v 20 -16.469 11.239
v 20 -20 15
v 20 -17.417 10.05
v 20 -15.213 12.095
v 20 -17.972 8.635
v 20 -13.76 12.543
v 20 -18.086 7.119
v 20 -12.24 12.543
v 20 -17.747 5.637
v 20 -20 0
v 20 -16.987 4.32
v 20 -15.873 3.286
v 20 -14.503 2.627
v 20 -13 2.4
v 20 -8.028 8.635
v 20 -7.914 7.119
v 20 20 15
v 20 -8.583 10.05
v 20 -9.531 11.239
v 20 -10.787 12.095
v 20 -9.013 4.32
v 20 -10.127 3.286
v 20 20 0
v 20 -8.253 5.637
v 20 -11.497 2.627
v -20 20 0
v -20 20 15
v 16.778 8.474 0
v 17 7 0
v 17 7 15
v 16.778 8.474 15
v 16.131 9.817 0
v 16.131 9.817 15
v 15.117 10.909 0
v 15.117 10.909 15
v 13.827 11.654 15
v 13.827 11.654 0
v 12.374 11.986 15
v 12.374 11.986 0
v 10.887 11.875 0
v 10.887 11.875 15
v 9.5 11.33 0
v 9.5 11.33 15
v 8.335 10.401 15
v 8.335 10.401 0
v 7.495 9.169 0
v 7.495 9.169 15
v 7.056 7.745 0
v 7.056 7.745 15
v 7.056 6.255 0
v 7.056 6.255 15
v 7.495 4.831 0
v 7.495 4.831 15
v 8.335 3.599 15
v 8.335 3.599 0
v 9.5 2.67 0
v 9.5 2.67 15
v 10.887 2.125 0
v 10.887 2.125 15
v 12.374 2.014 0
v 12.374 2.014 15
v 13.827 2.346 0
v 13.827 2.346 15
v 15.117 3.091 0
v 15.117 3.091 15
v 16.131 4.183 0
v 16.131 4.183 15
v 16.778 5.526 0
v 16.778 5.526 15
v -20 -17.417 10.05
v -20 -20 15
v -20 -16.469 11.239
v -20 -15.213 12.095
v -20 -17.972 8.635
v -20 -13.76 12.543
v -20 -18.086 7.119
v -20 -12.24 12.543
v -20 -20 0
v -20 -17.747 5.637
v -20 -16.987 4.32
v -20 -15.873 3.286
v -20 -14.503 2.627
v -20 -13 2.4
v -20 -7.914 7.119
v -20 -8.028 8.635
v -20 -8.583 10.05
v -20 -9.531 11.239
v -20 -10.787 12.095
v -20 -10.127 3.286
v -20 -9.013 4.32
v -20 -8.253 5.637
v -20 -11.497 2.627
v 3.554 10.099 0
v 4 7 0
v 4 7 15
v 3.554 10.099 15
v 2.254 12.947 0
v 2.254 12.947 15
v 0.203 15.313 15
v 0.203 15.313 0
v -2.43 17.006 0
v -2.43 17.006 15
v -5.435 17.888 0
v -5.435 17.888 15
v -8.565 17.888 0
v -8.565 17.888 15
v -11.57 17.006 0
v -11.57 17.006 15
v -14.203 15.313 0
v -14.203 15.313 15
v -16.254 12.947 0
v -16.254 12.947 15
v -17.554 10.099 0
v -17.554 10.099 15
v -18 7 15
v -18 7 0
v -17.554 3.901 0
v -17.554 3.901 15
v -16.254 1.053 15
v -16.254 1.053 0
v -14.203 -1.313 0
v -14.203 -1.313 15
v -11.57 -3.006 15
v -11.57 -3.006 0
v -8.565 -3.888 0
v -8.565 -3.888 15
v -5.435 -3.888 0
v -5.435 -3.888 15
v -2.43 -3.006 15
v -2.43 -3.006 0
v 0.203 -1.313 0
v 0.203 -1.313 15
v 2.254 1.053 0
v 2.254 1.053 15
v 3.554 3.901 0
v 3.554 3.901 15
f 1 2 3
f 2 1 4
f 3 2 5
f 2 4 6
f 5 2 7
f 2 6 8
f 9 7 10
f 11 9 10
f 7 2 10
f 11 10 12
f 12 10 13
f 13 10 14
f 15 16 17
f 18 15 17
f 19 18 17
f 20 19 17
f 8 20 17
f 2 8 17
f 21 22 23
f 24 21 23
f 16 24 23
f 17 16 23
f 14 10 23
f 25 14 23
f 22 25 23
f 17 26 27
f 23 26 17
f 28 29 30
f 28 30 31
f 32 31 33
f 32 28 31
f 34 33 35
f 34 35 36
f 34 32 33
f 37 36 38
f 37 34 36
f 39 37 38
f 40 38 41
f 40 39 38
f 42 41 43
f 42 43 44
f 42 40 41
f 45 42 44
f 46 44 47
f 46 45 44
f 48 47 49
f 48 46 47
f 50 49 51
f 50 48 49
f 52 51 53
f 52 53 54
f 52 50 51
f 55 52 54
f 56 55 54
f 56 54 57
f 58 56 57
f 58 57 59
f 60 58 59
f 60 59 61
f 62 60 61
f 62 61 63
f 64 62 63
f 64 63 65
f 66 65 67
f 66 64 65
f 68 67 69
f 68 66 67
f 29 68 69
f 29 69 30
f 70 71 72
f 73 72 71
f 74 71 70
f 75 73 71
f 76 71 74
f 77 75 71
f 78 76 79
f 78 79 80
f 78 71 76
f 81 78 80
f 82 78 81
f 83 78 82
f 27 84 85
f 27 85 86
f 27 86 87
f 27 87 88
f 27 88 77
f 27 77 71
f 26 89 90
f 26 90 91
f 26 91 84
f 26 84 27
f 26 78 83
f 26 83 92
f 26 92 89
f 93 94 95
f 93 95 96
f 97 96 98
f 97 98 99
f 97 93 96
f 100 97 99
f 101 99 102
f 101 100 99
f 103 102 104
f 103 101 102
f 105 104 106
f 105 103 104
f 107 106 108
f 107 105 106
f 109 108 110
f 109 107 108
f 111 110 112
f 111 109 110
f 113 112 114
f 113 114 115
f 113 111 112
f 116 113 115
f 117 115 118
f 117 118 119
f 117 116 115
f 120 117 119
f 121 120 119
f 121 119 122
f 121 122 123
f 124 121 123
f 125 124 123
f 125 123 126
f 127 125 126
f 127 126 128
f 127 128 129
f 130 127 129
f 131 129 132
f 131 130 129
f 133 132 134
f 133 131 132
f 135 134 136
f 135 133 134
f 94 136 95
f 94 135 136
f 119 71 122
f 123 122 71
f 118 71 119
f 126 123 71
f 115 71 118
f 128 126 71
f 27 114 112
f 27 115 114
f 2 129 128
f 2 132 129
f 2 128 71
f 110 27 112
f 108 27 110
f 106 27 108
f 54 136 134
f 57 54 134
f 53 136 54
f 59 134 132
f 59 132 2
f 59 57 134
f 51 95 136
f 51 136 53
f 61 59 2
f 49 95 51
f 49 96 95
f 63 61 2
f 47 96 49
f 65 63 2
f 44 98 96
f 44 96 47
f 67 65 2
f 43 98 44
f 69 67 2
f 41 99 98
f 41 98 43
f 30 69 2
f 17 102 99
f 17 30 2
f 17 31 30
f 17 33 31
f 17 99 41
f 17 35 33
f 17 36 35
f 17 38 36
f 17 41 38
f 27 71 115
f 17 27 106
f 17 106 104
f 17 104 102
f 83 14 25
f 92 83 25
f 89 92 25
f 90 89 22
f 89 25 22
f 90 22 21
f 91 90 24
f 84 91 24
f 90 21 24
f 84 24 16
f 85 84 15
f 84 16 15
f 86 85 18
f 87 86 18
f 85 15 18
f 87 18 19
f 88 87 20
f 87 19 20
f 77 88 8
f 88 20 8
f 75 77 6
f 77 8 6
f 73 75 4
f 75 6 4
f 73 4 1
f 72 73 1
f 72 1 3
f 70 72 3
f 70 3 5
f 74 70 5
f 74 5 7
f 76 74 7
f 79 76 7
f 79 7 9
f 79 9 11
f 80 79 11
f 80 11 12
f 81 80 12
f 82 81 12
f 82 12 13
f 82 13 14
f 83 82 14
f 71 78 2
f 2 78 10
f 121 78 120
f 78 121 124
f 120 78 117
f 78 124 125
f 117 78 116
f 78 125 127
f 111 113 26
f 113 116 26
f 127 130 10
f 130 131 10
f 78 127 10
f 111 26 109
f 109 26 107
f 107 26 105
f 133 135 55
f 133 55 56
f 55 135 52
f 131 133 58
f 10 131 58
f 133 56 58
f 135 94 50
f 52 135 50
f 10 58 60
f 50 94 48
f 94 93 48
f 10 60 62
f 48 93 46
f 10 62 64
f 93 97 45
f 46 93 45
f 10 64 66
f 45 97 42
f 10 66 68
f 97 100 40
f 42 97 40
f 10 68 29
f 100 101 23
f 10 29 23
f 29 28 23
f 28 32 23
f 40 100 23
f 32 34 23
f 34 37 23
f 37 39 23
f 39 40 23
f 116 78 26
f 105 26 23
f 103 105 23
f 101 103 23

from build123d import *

# Parameters (mm, degrees)
SKETCH2_W           = 40
SKETCH2_H           = 40
SKETCH2_R           = 5
SKETCH2_R_2         = 11
BOSS_EXTRUDE1_DEPTH = 15
SKETCH3_R           = 5.1
CUT_EXTRUDE1_DEPTH  = 48.16990566


with BuildPart() as part:
    # Sketch2 → Boss-Extrude1 (new body)
    with BuildSketch(Plane.XY):
        Rectangle(SKETCH2_W, SKETCH2_H)
        with Locations((12, 7)):
            Circle(SKETCH2_R, mode=Mode.SUBTRACT)
        with Locations((-7, 7)):
            Circle(SKETCH2_R_2, mode=Mode.SUBTRACT)
    extrude(amount=BOSS_EXTRUDE1_DEPTH)

    # Sketch3 → Cut-Extrude1 (cut, through all)
    with BuildSketch(Plane(origin=(20, 0, 0), x_dir=(0, 0, -1), z_dir=(1, 0, 0))):
        with Locations((-7.5, -13)):
            Circle(SKETCH3_R)
    extrude(amount=-CUT_EXTRUDE1_DEPTH, mode=Mode.SUBTRACT)


solid = part.part
